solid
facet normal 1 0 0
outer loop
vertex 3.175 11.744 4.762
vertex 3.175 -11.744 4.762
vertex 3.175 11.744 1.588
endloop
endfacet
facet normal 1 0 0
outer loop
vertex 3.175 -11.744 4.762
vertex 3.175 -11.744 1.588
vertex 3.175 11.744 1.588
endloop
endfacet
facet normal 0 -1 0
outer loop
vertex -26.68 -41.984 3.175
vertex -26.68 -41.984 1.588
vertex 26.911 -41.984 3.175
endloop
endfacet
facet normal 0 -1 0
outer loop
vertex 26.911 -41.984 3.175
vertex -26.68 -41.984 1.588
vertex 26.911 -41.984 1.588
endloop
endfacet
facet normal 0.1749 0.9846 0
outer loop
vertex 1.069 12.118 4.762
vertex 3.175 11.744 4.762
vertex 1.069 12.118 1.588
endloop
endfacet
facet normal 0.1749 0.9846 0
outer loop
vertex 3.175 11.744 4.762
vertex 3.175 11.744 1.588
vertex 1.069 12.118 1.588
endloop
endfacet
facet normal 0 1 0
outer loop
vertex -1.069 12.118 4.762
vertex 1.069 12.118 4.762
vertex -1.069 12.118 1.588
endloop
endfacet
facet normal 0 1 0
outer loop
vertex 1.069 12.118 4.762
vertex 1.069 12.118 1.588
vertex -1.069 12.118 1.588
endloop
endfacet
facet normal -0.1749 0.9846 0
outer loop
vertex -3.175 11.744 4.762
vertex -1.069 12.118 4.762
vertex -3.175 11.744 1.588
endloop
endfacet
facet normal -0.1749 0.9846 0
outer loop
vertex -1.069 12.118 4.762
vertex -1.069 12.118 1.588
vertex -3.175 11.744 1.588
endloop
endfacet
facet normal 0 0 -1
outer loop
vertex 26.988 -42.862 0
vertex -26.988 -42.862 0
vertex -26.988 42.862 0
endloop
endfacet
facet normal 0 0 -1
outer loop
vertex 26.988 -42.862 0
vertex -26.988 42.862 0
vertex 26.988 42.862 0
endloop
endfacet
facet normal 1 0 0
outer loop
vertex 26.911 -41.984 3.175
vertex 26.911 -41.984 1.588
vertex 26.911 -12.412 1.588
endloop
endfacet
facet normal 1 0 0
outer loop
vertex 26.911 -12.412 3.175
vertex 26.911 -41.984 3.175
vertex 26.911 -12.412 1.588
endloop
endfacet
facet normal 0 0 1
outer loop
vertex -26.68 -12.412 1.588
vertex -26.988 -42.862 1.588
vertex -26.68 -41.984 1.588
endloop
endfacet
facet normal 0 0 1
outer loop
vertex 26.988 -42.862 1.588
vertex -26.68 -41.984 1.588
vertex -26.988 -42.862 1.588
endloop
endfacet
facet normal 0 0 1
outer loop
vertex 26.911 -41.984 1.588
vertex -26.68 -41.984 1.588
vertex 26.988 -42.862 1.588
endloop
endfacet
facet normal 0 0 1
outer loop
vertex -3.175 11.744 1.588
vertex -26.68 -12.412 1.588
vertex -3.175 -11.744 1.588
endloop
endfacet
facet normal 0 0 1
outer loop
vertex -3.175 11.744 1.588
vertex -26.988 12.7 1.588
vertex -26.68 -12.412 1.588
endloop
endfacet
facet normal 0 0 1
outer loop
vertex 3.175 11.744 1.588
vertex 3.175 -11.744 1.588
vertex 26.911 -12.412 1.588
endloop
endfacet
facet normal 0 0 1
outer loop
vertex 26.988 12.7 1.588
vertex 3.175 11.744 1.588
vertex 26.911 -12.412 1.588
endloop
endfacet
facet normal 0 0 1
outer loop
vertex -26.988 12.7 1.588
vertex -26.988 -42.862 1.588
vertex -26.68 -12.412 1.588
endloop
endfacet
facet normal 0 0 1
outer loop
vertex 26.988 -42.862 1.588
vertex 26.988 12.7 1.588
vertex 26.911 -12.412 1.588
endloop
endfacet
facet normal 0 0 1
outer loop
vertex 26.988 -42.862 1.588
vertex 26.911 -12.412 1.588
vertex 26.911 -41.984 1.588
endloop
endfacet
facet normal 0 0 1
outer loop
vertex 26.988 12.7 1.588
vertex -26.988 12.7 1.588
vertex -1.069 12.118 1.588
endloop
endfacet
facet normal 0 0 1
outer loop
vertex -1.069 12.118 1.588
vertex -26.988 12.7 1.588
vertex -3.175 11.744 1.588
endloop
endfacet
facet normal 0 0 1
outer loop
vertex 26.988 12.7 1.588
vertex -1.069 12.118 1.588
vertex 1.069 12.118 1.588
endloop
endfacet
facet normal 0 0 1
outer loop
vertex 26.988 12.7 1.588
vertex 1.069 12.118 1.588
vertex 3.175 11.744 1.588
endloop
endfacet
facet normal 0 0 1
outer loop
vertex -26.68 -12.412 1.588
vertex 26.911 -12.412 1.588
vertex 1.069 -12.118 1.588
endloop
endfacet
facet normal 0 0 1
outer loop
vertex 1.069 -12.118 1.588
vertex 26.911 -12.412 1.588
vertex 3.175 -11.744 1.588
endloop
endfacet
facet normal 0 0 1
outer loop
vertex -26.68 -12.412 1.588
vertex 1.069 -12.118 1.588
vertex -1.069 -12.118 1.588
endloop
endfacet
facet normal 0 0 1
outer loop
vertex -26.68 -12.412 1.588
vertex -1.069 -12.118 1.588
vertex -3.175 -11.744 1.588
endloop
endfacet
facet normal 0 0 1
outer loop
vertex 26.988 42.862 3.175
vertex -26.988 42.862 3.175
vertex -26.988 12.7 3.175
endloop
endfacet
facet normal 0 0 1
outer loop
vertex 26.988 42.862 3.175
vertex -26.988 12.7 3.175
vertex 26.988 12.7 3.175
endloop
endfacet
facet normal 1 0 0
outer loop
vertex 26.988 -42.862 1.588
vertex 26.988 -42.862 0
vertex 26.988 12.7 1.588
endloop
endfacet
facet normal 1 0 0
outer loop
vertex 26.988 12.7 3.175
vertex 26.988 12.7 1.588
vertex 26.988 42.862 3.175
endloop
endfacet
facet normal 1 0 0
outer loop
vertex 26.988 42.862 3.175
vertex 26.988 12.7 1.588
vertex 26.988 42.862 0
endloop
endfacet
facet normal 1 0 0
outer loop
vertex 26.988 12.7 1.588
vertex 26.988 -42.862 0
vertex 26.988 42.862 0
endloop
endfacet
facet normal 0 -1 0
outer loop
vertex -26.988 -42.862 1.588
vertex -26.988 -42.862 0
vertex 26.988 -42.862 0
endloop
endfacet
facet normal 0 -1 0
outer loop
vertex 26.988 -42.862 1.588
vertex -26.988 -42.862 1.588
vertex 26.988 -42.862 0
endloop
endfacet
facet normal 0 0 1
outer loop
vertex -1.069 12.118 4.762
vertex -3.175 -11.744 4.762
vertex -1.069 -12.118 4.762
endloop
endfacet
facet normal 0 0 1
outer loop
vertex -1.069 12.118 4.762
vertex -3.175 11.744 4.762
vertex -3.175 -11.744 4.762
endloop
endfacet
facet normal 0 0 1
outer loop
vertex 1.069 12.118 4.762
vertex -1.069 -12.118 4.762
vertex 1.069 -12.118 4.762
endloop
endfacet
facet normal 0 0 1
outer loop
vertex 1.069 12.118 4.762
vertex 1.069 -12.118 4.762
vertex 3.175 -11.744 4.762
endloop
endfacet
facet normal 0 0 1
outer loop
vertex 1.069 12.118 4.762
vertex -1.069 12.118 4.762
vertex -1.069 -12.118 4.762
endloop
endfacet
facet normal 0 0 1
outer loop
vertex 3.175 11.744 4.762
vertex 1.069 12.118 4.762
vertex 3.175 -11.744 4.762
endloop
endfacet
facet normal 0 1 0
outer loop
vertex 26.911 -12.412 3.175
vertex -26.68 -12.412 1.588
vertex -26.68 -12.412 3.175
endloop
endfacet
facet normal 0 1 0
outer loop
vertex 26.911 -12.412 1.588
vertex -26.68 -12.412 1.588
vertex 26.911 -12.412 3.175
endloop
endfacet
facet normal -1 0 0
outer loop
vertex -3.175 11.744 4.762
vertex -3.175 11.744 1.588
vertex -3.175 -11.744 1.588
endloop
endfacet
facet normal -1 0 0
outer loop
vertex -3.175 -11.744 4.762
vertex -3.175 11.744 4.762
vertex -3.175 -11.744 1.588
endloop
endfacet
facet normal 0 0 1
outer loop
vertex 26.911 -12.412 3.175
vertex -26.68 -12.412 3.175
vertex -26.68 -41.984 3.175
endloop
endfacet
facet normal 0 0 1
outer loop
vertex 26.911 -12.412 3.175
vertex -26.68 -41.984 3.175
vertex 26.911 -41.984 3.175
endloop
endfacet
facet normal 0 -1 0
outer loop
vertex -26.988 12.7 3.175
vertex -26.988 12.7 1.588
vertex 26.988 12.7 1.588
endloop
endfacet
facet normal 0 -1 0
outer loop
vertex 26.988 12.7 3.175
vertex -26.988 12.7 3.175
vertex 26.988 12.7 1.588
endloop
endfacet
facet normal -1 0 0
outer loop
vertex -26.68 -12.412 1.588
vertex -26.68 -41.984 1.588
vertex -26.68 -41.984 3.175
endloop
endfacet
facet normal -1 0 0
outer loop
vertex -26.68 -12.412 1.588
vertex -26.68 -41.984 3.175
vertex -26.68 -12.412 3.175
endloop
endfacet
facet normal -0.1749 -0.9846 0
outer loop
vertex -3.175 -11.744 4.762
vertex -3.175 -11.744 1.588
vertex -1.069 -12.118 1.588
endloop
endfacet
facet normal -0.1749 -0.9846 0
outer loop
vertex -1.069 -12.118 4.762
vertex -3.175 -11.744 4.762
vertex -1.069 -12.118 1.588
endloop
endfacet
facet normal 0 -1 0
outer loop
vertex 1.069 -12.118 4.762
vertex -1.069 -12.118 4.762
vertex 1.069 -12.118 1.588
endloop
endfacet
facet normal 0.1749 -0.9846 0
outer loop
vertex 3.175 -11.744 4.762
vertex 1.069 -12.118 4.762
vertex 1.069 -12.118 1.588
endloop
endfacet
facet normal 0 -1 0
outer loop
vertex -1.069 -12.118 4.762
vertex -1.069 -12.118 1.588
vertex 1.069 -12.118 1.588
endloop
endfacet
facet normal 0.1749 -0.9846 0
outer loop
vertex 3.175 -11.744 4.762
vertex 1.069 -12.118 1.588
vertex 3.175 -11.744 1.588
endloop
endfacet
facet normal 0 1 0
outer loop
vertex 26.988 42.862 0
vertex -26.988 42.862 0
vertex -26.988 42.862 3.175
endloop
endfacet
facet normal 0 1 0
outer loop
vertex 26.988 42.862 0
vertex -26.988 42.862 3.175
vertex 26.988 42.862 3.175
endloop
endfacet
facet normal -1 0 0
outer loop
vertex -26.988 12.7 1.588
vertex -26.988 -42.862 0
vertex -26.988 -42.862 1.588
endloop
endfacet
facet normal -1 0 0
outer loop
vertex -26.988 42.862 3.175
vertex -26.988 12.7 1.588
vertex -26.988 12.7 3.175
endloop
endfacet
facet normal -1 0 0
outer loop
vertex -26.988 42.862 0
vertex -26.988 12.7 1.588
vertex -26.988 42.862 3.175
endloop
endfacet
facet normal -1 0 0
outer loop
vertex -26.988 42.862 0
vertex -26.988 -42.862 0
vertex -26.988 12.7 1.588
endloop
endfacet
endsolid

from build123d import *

# Parameters (mm, degrees)
F0_W      = 53.975
F0_H      = 85.725
F1_DEPTH  = 1.5875
F3_W      = 53.5911135375
F3_H      = 29.5717269182
F4_DEPTH  = 1.5875
F2_W      = 53.975
F2_H      = 30.1625
F5_DEPTH  = 1.5875
F9_DEPTH  = 1.5875
F10_DEPTH = 1.5875


# Not quite as in the source:
# - the program builds the solid bodies; features that only make, move or delete a surface that nothing else refers to are left out


with BuildPart() as f1:
    # F0 (on Top) → F1 (new body)
    with BuildSketch(Plane.XY):
        Rectangle(F0_W, F0_H)
    extrude(amount=F1_DEPTH)

    # F3 (on face) → F4 (join)
    with BuildSketch(Plane.XY.offset(1.5875)):
        with Locations((0.1150835305, -27.1980315447)):
            Rectangle(F3_W, F3_H)
    extrude(amount=F4_DEPTH)

    # F2 (on face) → F5 (join)
    with BuildSketch(Plane.XY.offset(1.5875)):
        with Locations((0, 27.78125)):
            Rectangle(F2_W, F2_H)
    extrude(amount=F5_DEPTH)

    # F8 (on face) → F9 (join)
    with BuildSketch(Plane.XY.offset(1.5875)):
        with BuildLine():
            ThreePointArc((-3.175, -11.7439402944), (0, -12.1655562404), (3.175, -11.7439402944))
            Line((3.175, -11.7439402944), (3.175, 11.7439402944))
            ThreePointArc((3.175, 11.7439402944), (0, 12.1655562404), (-3.175, 11.7439402944))
            Line((-3.175, 11.7439402944), (-3.175, -11.7439402944))
        make_face()
    extrude(amount=F9_DEPTH)

    # F10 (add): a face of the model
    f10_faces = [f1.faces().sort_by_distance(p)[0] for p in [
        (0, 0, 3.175),
    ]]
    extrude(f10_faces, amount=F10_DEPTH)


solid = f1.part
